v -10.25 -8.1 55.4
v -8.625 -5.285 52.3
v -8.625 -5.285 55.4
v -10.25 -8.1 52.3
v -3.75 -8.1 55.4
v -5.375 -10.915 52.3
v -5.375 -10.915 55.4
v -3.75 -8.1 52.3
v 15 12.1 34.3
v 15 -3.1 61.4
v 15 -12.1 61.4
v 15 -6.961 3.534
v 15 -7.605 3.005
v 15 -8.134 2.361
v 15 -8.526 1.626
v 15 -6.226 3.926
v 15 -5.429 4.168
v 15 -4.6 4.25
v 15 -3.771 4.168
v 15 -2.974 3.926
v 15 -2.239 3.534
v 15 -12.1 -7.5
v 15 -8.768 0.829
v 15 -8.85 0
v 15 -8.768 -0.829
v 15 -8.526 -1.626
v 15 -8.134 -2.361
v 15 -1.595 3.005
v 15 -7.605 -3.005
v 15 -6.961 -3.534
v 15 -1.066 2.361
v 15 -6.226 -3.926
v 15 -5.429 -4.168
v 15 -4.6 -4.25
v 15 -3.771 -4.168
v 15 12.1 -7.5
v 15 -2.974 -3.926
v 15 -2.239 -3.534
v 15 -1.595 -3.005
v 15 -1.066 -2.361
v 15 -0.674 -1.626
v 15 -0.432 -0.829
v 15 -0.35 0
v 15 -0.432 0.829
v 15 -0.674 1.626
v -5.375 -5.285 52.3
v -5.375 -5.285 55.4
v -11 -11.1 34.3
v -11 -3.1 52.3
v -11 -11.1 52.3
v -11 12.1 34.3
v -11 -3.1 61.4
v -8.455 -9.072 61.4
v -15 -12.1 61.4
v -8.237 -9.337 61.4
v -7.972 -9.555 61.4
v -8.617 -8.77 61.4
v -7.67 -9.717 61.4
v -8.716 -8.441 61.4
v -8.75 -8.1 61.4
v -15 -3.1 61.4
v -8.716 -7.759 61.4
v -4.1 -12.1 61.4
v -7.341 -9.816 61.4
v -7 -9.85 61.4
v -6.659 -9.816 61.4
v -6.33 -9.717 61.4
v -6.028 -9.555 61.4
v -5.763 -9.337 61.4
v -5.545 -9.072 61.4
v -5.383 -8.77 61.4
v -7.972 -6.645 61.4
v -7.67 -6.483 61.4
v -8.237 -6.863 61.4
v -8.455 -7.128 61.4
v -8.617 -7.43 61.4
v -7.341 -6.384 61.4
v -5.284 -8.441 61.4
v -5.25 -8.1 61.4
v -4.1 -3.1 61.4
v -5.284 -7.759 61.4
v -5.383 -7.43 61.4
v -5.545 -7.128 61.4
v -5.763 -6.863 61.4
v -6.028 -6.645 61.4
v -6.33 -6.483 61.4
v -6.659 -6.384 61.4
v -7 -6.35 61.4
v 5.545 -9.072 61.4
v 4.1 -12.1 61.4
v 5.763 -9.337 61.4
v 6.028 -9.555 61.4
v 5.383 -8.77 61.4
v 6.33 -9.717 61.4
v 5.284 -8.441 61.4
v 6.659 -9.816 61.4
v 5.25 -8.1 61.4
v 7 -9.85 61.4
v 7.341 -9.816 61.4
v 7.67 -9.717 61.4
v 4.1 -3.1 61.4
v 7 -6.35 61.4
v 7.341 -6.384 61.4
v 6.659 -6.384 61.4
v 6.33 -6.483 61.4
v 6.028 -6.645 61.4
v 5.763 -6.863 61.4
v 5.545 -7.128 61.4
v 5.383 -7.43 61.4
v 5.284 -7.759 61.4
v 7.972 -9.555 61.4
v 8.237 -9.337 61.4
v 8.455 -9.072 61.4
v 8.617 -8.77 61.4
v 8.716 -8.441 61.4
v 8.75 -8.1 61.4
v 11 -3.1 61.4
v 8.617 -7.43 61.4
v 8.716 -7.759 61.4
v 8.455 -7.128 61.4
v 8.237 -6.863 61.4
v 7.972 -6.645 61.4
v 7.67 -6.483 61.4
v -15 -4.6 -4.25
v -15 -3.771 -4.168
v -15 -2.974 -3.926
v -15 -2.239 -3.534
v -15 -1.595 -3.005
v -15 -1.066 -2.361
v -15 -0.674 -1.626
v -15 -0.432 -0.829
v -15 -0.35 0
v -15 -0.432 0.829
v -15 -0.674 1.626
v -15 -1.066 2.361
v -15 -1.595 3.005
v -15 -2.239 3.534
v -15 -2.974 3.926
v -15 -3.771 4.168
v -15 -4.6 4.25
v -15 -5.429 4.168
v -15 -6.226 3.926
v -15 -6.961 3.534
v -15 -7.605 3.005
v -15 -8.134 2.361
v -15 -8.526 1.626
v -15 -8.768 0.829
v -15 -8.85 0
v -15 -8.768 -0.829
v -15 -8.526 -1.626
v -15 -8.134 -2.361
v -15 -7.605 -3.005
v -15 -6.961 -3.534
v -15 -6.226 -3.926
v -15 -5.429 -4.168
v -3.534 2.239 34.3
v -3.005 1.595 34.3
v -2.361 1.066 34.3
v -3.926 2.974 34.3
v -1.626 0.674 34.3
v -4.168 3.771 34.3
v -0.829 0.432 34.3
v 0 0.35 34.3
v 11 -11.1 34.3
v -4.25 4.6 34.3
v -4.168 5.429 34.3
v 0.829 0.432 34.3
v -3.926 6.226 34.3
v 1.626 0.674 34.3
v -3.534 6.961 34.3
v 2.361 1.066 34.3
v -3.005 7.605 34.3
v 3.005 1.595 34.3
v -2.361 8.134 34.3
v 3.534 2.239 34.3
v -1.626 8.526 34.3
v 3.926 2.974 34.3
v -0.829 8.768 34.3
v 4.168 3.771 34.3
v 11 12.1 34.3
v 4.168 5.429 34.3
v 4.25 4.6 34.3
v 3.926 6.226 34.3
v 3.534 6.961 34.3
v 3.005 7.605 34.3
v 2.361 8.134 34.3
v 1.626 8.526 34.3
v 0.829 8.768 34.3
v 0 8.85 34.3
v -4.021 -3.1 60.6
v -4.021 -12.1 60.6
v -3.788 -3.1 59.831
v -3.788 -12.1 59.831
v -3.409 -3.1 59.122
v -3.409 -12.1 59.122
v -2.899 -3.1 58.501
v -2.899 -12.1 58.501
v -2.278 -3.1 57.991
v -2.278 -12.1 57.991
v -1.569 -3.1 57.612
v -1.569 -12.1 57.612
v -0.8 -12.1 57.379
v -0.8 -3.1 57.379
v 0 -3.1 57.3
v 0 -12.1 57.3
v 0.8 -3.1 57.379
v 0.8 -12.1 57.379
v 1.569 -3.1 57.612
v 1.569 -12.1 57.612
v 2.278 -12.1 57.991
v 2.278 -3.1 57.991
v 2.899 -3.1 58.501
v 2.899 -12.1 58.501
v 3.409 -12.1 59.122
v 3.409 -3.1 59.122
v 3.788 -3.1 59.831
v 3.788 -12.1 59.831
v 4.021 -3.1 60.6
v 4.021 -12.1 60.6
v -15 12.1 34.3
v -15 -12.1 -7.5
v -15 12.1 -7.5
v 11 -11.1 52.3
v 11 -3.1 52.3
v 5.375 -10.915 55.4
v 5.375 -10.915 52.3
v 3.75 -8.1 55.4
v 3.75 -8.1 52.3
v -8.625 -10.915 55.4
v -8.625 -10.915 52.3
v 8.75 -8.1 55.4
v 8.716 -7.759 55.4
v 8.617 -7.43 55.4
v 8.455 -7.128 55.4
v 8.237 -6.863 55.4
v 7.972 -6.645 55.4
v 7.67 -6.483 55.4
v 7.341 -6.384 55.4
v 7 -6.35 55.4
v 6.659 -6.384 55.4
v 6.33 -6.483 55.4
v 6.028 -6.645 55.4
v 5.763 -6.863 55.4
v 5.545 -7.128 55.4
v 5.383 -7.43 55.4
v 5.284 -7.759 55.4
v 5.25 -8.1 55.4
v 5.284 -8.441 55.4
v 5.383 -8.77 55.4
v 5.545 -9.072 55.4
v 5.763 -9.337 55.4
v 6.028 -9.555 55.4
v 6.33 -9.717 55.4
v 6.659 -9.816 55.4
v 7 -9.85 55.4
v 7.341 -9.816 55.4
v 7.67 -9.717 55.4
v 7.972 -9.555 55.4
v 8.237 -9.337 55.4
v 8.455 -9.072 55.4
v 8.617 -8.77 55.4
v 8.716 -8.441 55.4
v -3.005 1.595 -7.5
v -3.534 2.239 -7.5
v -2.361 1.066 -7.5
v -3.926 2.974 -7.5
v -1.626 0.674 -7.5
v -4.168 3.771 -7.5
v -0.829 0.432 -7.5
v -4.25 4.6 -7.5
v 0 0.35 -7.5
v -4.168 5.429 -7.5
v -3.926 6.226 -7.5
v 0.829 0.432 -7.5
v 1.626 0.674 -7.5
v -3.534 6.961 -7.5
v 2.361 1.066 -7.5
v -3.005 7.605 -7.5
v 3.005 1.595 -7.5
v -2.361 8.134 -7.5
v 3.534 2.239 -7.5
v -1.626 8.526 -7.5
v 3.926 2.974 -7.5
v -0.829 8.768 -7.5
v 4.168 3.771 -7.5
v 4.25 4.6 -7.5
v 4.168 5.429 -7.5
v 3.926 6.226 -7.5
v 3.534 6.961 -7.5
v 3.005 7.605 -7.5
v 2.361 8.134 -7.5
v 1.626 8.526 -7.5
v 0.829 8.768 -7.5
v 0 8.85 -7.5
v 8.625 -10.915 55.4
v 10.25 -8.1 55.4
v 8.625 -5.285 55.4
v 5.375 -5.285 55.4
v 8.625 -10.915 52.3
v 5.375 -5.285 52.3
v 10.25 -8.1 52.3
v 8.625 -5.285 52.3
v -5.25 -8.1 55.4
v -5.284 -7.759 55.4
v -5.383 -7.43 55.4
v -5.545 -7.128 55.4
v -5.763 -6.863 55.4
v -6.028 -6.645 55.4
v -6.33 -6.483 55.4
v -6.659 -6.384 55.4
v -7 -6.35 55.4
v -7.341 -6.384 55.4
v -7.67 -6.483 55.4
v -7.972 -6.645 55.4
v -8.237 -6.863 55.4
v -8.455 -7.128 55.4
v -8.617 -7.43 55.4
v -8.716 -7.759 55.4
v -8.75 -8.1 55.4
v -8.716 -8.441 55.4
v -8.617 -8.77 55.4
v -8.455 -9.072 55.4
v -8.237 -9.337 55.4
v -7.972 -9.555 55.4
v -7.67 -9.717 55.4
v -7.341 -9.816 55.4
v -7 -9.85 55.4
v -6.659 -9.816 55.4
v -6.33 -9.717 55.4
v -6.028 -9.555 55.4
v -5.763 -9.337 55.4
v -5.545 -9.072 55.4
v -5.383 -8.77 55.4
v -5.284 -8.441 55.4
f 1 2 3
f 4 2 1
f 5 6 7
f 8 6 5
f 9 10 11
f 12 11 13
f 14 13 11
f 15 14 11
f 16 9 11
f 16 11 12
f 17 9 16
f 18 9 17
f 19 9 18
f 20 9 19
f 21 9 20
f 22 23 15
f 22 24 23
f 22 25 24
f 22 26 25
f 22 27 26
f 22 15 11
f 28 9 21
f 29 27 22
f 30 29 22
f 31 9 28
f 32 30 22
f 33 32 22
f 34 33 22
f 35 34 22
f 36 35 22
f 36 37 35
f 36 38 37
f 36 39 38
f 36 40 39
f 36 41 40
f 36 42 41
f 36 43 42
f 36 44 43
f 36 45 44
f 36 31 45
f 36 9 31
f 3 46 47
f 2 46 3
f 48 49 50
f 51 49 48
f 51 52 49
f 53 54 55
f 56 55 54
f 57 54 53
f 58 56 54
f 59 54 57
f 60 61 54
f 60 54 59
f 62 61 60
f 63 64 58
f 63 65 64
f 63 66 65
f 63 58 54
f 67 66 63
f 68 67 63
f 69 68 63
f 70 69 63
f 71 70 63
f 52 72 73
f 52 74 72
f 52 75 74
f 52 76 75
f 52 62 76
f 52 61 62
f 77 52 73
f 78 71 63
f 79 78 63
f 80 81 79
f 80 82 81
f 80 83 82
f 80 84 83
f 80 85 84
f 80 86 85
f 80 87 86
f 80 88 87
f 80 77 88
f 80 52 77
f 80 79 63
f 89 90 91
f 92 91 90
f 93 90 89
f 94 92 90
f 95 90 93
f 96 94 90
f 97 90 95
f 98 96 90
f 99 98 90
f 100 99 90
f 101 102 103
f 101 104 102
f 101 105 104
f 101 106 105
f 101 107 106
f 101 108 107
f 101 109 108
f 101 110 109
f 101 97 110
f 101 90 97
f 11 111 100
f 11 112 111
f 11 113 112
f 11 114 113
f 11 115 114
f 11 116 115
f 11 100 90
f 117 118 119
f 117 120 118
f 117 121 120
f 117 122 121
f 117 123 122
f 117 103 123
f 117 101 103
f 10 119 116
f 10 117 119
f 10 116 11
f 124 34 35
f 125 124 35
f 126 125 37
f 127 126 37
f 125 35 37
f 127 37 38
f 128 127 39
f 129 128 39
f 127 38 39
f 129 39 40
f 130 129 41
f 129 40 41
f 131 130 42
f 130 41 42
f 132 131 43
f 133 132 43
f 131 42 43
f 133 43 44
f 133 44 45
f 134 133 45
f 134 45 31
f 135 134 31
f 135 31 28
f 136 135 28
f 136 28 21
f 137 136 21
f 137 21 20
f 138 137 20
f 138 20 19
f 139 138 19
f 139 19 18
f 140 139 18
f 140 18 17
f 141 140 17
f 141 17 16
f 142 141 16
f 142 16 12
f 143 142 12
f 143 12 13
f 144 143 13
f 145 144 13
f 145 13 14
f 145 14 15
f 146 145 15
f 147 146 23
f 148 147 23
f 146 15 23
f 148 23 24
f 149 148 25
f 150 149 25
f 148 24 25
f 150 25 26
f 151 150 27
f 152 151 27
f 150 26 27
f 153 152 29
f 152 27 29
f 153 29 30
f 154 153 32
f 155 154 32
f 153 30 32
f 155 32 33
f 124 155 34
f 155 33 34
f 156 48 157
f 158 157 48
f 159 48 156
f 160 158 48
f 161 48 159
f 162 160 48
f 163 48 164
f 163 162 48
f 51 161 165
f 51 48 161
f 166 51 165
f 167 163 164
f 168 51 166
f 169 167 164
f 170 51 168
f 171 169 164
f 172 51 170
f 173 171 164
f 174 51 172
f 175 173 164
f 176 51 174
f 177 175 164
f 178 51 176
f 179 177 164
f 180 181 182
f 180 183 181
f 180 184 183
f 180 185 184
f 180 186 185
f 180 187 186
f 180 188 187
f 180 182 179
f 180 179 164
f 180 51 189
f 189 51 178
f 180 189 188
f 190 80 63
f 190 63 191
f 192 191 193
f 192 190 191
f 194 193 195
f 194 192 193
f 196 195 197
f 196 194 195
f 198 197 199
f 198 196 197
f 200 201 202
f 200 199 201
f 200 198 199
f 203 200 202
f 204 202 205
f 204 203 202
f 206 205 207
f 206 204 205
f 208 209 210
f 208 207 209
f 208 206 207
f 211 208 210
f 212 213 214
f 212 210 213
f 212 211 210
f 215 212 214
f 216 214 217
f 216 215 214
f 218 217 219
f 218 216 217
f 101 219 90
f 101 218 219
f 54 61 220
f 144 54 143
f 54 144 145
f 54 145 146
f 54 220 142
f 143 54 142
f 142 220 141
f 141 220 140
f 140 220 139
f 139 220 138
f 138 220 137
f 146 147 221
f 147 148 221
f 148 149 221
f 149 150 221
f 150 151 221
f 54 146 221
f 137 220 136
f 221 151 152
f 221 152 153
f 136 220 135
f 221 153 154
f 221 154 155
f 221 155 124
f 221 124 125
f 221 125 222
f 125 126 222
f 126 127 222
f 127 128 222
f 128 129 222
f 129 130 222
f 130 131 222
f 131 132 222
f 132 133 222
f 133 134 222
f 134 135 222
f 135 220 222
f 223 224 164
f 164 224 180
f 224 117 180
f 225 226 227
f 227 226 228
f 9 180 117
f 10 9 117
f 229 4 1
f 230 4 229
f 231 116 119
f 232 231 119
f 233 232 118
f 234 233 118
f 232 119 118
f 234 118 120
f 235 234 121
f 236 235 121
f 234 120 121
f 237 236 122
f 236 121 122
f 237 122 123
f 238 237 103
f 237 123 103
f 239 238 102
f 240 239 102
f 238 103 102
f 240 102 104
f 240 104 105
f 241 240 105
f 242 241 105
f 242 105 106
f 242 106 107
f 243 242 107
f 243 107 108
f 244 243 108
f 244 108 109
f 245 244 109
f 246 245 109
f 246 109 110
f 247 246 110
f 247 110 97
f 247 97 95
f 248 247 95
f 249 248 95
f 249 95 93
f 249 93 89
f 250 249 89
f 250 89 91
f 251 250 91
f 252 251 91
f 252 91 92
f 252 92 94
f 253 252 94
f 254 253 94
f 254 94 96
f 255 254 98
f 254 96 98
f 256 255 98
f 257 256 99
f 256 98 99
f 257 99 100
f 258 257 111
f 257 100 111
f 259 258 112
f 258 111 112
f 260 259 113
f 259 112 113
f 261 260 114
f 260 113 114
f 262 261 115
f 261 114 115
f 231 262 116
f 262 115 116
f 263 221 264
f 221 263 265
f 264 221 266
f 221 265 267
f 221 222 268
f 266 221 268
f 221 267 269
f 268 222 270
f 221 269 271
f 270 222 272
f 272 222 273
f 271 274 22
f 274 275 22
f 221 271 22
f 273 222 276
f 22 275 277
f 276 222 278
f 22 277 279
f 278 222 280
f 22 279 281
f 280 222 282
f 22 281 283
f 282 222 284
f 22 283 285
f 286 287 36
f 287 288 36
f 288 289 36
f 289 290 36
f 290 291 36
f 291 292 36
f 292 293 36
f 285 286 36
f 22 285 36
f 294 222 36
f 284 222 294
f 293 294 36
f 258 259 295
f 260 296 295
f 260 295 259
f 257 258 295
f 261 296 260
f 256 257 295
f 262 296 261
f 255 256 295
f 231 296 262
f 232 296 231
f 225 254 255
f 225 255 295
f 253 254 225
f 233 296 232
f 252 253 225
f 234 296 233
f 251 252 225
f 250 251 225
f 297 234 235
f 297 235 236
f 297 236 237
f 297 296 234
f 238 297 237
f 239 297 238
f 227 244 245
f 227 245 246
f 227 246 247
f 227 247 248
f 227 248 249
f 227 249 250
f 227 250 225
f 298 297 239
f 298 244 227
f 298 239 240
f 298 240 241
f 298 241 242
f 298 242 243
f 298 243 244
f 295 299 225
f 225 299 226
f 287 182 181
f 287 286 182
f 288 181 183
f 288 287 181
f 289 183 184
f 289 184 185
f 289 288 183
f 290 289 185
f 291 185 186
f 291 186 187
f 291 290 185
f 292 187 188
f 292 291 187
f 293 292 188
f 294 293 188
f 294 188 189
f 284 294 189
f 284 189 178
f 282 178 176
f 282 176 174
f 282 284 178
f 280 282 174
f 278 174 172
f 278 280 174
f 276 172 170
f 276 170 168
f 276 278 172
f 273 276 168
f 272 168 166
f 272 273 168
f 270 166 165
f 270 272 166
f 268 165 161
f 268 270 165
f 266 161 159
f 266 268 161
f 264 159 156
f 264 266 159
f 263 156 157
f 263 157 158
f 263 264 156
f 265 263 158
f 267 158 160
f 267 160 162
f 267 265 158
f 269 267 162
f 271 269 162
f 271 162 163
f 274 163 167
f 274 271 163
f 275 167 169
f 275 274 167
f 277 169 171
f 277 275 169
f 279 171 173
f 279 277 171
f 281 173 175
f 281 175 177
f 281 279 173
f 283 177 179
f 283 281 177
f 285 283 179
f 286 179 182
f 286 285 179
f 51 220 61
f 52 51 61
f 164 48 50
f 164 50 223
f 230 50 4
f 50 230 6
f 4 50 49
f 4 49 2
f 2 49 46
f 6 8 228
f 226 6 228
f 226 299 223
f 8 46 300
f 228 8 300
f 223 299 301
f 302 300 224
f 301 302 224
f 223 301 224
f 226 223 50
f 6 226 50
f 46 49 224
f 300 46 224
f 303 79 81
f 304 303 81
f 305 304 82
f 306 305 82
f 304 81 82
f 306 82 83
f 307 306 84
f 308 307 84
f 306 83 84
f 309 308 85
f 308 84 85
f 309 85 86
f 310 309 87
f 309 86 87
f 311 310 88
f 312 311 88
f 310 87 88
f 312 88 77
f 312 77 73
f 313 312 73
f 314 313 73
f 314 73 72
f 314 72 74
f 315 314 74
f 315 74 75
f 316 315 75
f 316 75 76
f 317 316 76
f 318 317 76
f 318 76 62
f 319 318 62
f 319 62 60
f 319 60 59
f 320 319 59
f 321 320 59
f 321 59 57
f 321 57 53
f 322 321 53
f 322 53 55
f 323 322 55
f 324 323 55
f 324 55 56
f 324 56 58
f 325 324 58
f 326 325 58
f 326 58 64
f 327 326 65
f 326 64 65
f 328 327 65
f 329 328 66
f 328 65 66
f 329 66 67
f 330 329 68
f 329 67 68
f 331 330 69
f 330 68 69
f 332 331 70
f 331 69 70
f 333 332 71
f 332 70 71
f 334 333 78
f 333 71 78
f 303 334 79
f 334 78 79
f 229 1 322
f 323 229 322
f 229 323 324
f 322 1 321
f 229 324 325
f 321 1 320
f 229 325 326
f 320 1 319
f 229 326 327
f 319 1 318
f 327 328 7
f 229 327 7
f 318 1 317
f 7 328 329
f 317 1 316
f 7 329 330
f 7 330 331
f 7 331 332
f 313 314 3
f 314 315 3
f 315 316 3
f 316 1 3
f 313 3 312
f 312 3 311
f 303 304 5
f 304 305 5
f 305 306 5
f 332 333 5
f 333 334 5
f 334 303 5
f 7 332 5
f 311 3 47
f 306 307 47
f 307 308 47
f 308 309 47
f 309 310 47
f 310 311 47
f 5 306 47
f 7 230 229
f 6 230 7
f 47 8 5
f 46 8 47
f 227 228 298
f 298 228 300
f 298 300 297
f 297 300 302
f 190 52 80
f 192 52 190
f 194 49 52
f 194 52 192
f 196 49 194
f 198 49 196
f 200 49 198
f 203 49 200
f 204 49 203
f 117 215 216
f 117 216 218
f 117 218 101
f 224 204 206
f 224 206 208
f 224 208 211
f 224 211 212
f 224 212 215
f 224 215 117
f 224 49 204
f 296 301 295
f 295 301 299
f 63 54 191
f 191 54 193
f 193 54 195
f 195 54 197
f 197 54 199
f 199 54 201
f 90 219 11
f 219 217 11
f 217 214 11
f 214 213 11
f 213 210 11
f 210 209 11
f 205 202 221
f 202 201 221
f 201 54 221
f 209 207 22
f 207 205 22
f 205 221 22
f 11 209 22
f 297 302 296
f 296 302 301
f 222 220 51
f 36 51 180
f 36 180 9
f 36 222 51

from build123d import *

# Parameters (mm, degrees)
SCHIZZO7_W                   = 30
SCHIZZO7_H                   = 24.2
SCHIZZO7_R                   = 4.25
ESTRUSIONE_ESTRUSIONE3_DEPTH = 7.5
TAGLIO_ESTRUSIONE1_REACH     = 35.206
SCHIZZO8_R                   = 4.25
SCHIZZO12_W                  = 30
SCHIZZO12_H                  = 9
ESTRUSIONE_ESTRUSIONE5_DEPTH = 53.9
TAGLIO_ESTRUSIONE3_REACH     = 67.008
SCHIZZO15_W                  = 22
SCHIZZO15_H                  = 18
TAGLIO_ESTRUSIONE4_DEPTH     = 8
TAGLIO_ESTRUSIONE5_REACH     = 73.545
SCHIZZO16_R                  = 1.75
TAGLIO_ESTRUSIONE6_DEPTH     = 3.1
SCHIZZO20_W                  = 30
SCHIZZO20_H                  = 15.2
SCHIZZO20_R                  = 4.25
ESTRUSIONE_ESTRUSIONE6_DEPTH = 26.8
ESTRUSIONE_ESTRUSIONE7_DEPTH = 4
ESTRUSIONE_ESTRUSIONE8_START = -4
ESTRUSIONE_ESTRUSIONE8_DEPTH = 4


with BuildPart() as part:
    # Schizzo7 → Estrusione-Estrusione3 (new, symmetric)
    with BuildSketch(Plane.XY):
        Rectangle(SCHIZZO7_W, SCHIZZO7_H)
        with Locations((0, 4.6)):
            Circle(SCHIZZO7_R, mode=Mode.SUBTRACT)
    extrude(amount=ESTRUSIONE_ESTRUSIONE3_DEPTH, both=True)

    # Schizzo8 → Taglio-Estrusione1 (cut, up to next)
    with BuildSketch(Plane(origin=(15, 0, 0), x_dir=(0, 0, -1), z_dir=(1, 0, 0)), mode=Mode.PRIVATE) as taglio_estrusione1_sk1:
        with Locations((0, -4.6)):
            Circle(SCHIZZO8_R)
    taglio_estrusione1_tool1 = extrude(taglio_estrusione1_sk1.sketch, amount=-TAGLIO_ESTRUSIONE1_REACH, mode=Mode.PRIVATE) & part.part
    add(taglio_estrusione1_tool1.solids().sort_by_distance((15, -4.6, 0))[0], mode=Mode.SUBTRACT)

    # Schizzo12 → Estrusione-Estrusione5 (add)
    with BuildSketch(Plane.XY.offset(7.5)):
        with Locations((0, -7.6)):
            Rectangle(SCHIZZO12_W, SCHIZZO12_H)
    extrude(amount=ESTRUSIONE_ESTRUSIONE5_DEPTH)

    # Schizzo14 → Taglio-Estrusione3 (cut, up to next)
    with BuildSketch(Plane(origin=(0, -3.1, 0), x_dir=(1, 0, 0), z_dir=(0, 1, 0)), mode=Mode.PRIVATE) as taglio_estrusione3_sk1:
        with BuildLine():
            Line((4.1, -61.4), (-4.1, -61.4))
            ThreePointArc((-4.1, -61.4), (0, -57.3), (4.1, -61.4))
        make_face()
    taglio_estrusione3_tool1 = extrude(taglio_estrusione3_sk1.sketch, amount=-TAGLIO_ESTRUSIONE3_REACH, mode=Mode.PRIVATE) & part.part
    add(taglio_estrusione3_tool1.solids().sort_by_distance((0, -3.1, 59.659906))[0], mode=Mode.SUBTRACT)

    # Schizzo15 → Taglio-Estrusione4 (cut)
    with BuildSketch(Plane(origin=(0, -3.1, 0), x_dir=(1, 0, 0), z_dir=(0, 1, 0))):
        with Locations((0, -43.3)):
            Rectangle(SCHIZZO15_W, SCHIZZO15_H)
    extrude(amount=-TAGLIO_ESTRUSIONE4_DEPTH, mode=Mode.SUBTRACT)

    # Schizzo16 → Taglio-Estrusione5 (cut, up to next)
    with BuildSketch(Plane.XY.offset(61.4), mode=Mode.PRIVATE) as taglio_estrusione5_sk1:
        with Locations((-7, -8.1)):
            Circle(SCHIZZO16_R)
    taglio_estrusione5_tool1 = extrude(taglio_estrusione5_sk1.sketch, amount=-TAGLIO_ESTRUSIONE5_REACH, mode=Mode.PRIVATE) & part.part
    # Schizzo16 → Taglio-Estrusione5 (cut, up to next)
    with BuildSketch(Plane.XY.offset(61.4), mode=Mode.PRIVATE) as taglio_estrusione5_sk2:
        with Locations((7, -8.1)):
            Circle(SCHIZZO16_R)
    taglio_estrusione5_tool2 = extrude(taglio_estrusione5_sk2.sketch, amount=-TAGLIO_ESTRUSIONE5_REACH, mode=Mode.PRIVATE) & part.part
    add(taglio_estrusione5_tool1.solids().sort_by_distance((-7, -8.1, 61.4))[0], mode=Mode.SUBTRACT)
    add(taglio_estrusione5_tool2.solids().sort_by_distance((7, -8.1, 61.4))[0], mode=Mode.SUBTRACT)

    # Schizzo17 → Taglio-Estrusione6 (cut)
    with BuildSketch(Plane(origin=(0, 0, 52.3), x_dir=(-1, 0, 0), z_dir=(0, 0, -1))):
        Polygon((-3.75, -8.1), (-5.375, -5.285417438), (-8.625, -5.285417438), (-10.25, -8.1), (-8.625, -10.914582562), (-5.375, -10.914582562), align=None)
        Polygon((5.375, -10.914582562), (3.75, -8.1), (5.375, -5.285417438), (8.625, -5.285417438), (10.25, -8.1), (8.625, -10.914582562), align=None)
    extrude(amount=-TAGLIO_ESTRUSIONE6_DEPTH, mode=Mode.SUBTRACT)

    # Schizzo20 → Estrusione-Estrusione6 (add)
    with BuildSketch(Plane.XY.offset(7.5)):
        with Locations((0, 4.5)):
            Rectangle(SCHIZZO20_W, SCHIZZO20_H)
        with Locations((0, 4.6)):
            Circle(SCHIZZO20_R, mode=Mode.SUBTRACT)
    extrude(amount=ESTRUSIONE_ESTRUSIONE6_DEPTH)

    # Schizzo21 → Estrusione-Estrusione7 (add)
    with BuildSketch(Plane.ZY.offset(15)):
        Polygon((34.3, 12.1), (61.4, -3.1), (34.3, -3.1), align=None)
    extrude(amount=-ESTRUSIONE_ESTRUSIONE7_DEPTH)

    # Schizzo22 → Estrusione-Estrusione8 (add)
    with BuildSketch(Plane(origin=(15, 0, 0), x_dir=(0, 0, -1), z_dir=(1, 0, 0)).offset(ESTRUSIONE_ESTRUSIONE8_START)):
        Polygon((-34.3, 12.1), (-61.4, -3.1), (-34.3, -3.1), align=None)
    extrude(amount=ESTRUSIONE_ESTRUSIONE8_DEPTH)


solid = part.part
